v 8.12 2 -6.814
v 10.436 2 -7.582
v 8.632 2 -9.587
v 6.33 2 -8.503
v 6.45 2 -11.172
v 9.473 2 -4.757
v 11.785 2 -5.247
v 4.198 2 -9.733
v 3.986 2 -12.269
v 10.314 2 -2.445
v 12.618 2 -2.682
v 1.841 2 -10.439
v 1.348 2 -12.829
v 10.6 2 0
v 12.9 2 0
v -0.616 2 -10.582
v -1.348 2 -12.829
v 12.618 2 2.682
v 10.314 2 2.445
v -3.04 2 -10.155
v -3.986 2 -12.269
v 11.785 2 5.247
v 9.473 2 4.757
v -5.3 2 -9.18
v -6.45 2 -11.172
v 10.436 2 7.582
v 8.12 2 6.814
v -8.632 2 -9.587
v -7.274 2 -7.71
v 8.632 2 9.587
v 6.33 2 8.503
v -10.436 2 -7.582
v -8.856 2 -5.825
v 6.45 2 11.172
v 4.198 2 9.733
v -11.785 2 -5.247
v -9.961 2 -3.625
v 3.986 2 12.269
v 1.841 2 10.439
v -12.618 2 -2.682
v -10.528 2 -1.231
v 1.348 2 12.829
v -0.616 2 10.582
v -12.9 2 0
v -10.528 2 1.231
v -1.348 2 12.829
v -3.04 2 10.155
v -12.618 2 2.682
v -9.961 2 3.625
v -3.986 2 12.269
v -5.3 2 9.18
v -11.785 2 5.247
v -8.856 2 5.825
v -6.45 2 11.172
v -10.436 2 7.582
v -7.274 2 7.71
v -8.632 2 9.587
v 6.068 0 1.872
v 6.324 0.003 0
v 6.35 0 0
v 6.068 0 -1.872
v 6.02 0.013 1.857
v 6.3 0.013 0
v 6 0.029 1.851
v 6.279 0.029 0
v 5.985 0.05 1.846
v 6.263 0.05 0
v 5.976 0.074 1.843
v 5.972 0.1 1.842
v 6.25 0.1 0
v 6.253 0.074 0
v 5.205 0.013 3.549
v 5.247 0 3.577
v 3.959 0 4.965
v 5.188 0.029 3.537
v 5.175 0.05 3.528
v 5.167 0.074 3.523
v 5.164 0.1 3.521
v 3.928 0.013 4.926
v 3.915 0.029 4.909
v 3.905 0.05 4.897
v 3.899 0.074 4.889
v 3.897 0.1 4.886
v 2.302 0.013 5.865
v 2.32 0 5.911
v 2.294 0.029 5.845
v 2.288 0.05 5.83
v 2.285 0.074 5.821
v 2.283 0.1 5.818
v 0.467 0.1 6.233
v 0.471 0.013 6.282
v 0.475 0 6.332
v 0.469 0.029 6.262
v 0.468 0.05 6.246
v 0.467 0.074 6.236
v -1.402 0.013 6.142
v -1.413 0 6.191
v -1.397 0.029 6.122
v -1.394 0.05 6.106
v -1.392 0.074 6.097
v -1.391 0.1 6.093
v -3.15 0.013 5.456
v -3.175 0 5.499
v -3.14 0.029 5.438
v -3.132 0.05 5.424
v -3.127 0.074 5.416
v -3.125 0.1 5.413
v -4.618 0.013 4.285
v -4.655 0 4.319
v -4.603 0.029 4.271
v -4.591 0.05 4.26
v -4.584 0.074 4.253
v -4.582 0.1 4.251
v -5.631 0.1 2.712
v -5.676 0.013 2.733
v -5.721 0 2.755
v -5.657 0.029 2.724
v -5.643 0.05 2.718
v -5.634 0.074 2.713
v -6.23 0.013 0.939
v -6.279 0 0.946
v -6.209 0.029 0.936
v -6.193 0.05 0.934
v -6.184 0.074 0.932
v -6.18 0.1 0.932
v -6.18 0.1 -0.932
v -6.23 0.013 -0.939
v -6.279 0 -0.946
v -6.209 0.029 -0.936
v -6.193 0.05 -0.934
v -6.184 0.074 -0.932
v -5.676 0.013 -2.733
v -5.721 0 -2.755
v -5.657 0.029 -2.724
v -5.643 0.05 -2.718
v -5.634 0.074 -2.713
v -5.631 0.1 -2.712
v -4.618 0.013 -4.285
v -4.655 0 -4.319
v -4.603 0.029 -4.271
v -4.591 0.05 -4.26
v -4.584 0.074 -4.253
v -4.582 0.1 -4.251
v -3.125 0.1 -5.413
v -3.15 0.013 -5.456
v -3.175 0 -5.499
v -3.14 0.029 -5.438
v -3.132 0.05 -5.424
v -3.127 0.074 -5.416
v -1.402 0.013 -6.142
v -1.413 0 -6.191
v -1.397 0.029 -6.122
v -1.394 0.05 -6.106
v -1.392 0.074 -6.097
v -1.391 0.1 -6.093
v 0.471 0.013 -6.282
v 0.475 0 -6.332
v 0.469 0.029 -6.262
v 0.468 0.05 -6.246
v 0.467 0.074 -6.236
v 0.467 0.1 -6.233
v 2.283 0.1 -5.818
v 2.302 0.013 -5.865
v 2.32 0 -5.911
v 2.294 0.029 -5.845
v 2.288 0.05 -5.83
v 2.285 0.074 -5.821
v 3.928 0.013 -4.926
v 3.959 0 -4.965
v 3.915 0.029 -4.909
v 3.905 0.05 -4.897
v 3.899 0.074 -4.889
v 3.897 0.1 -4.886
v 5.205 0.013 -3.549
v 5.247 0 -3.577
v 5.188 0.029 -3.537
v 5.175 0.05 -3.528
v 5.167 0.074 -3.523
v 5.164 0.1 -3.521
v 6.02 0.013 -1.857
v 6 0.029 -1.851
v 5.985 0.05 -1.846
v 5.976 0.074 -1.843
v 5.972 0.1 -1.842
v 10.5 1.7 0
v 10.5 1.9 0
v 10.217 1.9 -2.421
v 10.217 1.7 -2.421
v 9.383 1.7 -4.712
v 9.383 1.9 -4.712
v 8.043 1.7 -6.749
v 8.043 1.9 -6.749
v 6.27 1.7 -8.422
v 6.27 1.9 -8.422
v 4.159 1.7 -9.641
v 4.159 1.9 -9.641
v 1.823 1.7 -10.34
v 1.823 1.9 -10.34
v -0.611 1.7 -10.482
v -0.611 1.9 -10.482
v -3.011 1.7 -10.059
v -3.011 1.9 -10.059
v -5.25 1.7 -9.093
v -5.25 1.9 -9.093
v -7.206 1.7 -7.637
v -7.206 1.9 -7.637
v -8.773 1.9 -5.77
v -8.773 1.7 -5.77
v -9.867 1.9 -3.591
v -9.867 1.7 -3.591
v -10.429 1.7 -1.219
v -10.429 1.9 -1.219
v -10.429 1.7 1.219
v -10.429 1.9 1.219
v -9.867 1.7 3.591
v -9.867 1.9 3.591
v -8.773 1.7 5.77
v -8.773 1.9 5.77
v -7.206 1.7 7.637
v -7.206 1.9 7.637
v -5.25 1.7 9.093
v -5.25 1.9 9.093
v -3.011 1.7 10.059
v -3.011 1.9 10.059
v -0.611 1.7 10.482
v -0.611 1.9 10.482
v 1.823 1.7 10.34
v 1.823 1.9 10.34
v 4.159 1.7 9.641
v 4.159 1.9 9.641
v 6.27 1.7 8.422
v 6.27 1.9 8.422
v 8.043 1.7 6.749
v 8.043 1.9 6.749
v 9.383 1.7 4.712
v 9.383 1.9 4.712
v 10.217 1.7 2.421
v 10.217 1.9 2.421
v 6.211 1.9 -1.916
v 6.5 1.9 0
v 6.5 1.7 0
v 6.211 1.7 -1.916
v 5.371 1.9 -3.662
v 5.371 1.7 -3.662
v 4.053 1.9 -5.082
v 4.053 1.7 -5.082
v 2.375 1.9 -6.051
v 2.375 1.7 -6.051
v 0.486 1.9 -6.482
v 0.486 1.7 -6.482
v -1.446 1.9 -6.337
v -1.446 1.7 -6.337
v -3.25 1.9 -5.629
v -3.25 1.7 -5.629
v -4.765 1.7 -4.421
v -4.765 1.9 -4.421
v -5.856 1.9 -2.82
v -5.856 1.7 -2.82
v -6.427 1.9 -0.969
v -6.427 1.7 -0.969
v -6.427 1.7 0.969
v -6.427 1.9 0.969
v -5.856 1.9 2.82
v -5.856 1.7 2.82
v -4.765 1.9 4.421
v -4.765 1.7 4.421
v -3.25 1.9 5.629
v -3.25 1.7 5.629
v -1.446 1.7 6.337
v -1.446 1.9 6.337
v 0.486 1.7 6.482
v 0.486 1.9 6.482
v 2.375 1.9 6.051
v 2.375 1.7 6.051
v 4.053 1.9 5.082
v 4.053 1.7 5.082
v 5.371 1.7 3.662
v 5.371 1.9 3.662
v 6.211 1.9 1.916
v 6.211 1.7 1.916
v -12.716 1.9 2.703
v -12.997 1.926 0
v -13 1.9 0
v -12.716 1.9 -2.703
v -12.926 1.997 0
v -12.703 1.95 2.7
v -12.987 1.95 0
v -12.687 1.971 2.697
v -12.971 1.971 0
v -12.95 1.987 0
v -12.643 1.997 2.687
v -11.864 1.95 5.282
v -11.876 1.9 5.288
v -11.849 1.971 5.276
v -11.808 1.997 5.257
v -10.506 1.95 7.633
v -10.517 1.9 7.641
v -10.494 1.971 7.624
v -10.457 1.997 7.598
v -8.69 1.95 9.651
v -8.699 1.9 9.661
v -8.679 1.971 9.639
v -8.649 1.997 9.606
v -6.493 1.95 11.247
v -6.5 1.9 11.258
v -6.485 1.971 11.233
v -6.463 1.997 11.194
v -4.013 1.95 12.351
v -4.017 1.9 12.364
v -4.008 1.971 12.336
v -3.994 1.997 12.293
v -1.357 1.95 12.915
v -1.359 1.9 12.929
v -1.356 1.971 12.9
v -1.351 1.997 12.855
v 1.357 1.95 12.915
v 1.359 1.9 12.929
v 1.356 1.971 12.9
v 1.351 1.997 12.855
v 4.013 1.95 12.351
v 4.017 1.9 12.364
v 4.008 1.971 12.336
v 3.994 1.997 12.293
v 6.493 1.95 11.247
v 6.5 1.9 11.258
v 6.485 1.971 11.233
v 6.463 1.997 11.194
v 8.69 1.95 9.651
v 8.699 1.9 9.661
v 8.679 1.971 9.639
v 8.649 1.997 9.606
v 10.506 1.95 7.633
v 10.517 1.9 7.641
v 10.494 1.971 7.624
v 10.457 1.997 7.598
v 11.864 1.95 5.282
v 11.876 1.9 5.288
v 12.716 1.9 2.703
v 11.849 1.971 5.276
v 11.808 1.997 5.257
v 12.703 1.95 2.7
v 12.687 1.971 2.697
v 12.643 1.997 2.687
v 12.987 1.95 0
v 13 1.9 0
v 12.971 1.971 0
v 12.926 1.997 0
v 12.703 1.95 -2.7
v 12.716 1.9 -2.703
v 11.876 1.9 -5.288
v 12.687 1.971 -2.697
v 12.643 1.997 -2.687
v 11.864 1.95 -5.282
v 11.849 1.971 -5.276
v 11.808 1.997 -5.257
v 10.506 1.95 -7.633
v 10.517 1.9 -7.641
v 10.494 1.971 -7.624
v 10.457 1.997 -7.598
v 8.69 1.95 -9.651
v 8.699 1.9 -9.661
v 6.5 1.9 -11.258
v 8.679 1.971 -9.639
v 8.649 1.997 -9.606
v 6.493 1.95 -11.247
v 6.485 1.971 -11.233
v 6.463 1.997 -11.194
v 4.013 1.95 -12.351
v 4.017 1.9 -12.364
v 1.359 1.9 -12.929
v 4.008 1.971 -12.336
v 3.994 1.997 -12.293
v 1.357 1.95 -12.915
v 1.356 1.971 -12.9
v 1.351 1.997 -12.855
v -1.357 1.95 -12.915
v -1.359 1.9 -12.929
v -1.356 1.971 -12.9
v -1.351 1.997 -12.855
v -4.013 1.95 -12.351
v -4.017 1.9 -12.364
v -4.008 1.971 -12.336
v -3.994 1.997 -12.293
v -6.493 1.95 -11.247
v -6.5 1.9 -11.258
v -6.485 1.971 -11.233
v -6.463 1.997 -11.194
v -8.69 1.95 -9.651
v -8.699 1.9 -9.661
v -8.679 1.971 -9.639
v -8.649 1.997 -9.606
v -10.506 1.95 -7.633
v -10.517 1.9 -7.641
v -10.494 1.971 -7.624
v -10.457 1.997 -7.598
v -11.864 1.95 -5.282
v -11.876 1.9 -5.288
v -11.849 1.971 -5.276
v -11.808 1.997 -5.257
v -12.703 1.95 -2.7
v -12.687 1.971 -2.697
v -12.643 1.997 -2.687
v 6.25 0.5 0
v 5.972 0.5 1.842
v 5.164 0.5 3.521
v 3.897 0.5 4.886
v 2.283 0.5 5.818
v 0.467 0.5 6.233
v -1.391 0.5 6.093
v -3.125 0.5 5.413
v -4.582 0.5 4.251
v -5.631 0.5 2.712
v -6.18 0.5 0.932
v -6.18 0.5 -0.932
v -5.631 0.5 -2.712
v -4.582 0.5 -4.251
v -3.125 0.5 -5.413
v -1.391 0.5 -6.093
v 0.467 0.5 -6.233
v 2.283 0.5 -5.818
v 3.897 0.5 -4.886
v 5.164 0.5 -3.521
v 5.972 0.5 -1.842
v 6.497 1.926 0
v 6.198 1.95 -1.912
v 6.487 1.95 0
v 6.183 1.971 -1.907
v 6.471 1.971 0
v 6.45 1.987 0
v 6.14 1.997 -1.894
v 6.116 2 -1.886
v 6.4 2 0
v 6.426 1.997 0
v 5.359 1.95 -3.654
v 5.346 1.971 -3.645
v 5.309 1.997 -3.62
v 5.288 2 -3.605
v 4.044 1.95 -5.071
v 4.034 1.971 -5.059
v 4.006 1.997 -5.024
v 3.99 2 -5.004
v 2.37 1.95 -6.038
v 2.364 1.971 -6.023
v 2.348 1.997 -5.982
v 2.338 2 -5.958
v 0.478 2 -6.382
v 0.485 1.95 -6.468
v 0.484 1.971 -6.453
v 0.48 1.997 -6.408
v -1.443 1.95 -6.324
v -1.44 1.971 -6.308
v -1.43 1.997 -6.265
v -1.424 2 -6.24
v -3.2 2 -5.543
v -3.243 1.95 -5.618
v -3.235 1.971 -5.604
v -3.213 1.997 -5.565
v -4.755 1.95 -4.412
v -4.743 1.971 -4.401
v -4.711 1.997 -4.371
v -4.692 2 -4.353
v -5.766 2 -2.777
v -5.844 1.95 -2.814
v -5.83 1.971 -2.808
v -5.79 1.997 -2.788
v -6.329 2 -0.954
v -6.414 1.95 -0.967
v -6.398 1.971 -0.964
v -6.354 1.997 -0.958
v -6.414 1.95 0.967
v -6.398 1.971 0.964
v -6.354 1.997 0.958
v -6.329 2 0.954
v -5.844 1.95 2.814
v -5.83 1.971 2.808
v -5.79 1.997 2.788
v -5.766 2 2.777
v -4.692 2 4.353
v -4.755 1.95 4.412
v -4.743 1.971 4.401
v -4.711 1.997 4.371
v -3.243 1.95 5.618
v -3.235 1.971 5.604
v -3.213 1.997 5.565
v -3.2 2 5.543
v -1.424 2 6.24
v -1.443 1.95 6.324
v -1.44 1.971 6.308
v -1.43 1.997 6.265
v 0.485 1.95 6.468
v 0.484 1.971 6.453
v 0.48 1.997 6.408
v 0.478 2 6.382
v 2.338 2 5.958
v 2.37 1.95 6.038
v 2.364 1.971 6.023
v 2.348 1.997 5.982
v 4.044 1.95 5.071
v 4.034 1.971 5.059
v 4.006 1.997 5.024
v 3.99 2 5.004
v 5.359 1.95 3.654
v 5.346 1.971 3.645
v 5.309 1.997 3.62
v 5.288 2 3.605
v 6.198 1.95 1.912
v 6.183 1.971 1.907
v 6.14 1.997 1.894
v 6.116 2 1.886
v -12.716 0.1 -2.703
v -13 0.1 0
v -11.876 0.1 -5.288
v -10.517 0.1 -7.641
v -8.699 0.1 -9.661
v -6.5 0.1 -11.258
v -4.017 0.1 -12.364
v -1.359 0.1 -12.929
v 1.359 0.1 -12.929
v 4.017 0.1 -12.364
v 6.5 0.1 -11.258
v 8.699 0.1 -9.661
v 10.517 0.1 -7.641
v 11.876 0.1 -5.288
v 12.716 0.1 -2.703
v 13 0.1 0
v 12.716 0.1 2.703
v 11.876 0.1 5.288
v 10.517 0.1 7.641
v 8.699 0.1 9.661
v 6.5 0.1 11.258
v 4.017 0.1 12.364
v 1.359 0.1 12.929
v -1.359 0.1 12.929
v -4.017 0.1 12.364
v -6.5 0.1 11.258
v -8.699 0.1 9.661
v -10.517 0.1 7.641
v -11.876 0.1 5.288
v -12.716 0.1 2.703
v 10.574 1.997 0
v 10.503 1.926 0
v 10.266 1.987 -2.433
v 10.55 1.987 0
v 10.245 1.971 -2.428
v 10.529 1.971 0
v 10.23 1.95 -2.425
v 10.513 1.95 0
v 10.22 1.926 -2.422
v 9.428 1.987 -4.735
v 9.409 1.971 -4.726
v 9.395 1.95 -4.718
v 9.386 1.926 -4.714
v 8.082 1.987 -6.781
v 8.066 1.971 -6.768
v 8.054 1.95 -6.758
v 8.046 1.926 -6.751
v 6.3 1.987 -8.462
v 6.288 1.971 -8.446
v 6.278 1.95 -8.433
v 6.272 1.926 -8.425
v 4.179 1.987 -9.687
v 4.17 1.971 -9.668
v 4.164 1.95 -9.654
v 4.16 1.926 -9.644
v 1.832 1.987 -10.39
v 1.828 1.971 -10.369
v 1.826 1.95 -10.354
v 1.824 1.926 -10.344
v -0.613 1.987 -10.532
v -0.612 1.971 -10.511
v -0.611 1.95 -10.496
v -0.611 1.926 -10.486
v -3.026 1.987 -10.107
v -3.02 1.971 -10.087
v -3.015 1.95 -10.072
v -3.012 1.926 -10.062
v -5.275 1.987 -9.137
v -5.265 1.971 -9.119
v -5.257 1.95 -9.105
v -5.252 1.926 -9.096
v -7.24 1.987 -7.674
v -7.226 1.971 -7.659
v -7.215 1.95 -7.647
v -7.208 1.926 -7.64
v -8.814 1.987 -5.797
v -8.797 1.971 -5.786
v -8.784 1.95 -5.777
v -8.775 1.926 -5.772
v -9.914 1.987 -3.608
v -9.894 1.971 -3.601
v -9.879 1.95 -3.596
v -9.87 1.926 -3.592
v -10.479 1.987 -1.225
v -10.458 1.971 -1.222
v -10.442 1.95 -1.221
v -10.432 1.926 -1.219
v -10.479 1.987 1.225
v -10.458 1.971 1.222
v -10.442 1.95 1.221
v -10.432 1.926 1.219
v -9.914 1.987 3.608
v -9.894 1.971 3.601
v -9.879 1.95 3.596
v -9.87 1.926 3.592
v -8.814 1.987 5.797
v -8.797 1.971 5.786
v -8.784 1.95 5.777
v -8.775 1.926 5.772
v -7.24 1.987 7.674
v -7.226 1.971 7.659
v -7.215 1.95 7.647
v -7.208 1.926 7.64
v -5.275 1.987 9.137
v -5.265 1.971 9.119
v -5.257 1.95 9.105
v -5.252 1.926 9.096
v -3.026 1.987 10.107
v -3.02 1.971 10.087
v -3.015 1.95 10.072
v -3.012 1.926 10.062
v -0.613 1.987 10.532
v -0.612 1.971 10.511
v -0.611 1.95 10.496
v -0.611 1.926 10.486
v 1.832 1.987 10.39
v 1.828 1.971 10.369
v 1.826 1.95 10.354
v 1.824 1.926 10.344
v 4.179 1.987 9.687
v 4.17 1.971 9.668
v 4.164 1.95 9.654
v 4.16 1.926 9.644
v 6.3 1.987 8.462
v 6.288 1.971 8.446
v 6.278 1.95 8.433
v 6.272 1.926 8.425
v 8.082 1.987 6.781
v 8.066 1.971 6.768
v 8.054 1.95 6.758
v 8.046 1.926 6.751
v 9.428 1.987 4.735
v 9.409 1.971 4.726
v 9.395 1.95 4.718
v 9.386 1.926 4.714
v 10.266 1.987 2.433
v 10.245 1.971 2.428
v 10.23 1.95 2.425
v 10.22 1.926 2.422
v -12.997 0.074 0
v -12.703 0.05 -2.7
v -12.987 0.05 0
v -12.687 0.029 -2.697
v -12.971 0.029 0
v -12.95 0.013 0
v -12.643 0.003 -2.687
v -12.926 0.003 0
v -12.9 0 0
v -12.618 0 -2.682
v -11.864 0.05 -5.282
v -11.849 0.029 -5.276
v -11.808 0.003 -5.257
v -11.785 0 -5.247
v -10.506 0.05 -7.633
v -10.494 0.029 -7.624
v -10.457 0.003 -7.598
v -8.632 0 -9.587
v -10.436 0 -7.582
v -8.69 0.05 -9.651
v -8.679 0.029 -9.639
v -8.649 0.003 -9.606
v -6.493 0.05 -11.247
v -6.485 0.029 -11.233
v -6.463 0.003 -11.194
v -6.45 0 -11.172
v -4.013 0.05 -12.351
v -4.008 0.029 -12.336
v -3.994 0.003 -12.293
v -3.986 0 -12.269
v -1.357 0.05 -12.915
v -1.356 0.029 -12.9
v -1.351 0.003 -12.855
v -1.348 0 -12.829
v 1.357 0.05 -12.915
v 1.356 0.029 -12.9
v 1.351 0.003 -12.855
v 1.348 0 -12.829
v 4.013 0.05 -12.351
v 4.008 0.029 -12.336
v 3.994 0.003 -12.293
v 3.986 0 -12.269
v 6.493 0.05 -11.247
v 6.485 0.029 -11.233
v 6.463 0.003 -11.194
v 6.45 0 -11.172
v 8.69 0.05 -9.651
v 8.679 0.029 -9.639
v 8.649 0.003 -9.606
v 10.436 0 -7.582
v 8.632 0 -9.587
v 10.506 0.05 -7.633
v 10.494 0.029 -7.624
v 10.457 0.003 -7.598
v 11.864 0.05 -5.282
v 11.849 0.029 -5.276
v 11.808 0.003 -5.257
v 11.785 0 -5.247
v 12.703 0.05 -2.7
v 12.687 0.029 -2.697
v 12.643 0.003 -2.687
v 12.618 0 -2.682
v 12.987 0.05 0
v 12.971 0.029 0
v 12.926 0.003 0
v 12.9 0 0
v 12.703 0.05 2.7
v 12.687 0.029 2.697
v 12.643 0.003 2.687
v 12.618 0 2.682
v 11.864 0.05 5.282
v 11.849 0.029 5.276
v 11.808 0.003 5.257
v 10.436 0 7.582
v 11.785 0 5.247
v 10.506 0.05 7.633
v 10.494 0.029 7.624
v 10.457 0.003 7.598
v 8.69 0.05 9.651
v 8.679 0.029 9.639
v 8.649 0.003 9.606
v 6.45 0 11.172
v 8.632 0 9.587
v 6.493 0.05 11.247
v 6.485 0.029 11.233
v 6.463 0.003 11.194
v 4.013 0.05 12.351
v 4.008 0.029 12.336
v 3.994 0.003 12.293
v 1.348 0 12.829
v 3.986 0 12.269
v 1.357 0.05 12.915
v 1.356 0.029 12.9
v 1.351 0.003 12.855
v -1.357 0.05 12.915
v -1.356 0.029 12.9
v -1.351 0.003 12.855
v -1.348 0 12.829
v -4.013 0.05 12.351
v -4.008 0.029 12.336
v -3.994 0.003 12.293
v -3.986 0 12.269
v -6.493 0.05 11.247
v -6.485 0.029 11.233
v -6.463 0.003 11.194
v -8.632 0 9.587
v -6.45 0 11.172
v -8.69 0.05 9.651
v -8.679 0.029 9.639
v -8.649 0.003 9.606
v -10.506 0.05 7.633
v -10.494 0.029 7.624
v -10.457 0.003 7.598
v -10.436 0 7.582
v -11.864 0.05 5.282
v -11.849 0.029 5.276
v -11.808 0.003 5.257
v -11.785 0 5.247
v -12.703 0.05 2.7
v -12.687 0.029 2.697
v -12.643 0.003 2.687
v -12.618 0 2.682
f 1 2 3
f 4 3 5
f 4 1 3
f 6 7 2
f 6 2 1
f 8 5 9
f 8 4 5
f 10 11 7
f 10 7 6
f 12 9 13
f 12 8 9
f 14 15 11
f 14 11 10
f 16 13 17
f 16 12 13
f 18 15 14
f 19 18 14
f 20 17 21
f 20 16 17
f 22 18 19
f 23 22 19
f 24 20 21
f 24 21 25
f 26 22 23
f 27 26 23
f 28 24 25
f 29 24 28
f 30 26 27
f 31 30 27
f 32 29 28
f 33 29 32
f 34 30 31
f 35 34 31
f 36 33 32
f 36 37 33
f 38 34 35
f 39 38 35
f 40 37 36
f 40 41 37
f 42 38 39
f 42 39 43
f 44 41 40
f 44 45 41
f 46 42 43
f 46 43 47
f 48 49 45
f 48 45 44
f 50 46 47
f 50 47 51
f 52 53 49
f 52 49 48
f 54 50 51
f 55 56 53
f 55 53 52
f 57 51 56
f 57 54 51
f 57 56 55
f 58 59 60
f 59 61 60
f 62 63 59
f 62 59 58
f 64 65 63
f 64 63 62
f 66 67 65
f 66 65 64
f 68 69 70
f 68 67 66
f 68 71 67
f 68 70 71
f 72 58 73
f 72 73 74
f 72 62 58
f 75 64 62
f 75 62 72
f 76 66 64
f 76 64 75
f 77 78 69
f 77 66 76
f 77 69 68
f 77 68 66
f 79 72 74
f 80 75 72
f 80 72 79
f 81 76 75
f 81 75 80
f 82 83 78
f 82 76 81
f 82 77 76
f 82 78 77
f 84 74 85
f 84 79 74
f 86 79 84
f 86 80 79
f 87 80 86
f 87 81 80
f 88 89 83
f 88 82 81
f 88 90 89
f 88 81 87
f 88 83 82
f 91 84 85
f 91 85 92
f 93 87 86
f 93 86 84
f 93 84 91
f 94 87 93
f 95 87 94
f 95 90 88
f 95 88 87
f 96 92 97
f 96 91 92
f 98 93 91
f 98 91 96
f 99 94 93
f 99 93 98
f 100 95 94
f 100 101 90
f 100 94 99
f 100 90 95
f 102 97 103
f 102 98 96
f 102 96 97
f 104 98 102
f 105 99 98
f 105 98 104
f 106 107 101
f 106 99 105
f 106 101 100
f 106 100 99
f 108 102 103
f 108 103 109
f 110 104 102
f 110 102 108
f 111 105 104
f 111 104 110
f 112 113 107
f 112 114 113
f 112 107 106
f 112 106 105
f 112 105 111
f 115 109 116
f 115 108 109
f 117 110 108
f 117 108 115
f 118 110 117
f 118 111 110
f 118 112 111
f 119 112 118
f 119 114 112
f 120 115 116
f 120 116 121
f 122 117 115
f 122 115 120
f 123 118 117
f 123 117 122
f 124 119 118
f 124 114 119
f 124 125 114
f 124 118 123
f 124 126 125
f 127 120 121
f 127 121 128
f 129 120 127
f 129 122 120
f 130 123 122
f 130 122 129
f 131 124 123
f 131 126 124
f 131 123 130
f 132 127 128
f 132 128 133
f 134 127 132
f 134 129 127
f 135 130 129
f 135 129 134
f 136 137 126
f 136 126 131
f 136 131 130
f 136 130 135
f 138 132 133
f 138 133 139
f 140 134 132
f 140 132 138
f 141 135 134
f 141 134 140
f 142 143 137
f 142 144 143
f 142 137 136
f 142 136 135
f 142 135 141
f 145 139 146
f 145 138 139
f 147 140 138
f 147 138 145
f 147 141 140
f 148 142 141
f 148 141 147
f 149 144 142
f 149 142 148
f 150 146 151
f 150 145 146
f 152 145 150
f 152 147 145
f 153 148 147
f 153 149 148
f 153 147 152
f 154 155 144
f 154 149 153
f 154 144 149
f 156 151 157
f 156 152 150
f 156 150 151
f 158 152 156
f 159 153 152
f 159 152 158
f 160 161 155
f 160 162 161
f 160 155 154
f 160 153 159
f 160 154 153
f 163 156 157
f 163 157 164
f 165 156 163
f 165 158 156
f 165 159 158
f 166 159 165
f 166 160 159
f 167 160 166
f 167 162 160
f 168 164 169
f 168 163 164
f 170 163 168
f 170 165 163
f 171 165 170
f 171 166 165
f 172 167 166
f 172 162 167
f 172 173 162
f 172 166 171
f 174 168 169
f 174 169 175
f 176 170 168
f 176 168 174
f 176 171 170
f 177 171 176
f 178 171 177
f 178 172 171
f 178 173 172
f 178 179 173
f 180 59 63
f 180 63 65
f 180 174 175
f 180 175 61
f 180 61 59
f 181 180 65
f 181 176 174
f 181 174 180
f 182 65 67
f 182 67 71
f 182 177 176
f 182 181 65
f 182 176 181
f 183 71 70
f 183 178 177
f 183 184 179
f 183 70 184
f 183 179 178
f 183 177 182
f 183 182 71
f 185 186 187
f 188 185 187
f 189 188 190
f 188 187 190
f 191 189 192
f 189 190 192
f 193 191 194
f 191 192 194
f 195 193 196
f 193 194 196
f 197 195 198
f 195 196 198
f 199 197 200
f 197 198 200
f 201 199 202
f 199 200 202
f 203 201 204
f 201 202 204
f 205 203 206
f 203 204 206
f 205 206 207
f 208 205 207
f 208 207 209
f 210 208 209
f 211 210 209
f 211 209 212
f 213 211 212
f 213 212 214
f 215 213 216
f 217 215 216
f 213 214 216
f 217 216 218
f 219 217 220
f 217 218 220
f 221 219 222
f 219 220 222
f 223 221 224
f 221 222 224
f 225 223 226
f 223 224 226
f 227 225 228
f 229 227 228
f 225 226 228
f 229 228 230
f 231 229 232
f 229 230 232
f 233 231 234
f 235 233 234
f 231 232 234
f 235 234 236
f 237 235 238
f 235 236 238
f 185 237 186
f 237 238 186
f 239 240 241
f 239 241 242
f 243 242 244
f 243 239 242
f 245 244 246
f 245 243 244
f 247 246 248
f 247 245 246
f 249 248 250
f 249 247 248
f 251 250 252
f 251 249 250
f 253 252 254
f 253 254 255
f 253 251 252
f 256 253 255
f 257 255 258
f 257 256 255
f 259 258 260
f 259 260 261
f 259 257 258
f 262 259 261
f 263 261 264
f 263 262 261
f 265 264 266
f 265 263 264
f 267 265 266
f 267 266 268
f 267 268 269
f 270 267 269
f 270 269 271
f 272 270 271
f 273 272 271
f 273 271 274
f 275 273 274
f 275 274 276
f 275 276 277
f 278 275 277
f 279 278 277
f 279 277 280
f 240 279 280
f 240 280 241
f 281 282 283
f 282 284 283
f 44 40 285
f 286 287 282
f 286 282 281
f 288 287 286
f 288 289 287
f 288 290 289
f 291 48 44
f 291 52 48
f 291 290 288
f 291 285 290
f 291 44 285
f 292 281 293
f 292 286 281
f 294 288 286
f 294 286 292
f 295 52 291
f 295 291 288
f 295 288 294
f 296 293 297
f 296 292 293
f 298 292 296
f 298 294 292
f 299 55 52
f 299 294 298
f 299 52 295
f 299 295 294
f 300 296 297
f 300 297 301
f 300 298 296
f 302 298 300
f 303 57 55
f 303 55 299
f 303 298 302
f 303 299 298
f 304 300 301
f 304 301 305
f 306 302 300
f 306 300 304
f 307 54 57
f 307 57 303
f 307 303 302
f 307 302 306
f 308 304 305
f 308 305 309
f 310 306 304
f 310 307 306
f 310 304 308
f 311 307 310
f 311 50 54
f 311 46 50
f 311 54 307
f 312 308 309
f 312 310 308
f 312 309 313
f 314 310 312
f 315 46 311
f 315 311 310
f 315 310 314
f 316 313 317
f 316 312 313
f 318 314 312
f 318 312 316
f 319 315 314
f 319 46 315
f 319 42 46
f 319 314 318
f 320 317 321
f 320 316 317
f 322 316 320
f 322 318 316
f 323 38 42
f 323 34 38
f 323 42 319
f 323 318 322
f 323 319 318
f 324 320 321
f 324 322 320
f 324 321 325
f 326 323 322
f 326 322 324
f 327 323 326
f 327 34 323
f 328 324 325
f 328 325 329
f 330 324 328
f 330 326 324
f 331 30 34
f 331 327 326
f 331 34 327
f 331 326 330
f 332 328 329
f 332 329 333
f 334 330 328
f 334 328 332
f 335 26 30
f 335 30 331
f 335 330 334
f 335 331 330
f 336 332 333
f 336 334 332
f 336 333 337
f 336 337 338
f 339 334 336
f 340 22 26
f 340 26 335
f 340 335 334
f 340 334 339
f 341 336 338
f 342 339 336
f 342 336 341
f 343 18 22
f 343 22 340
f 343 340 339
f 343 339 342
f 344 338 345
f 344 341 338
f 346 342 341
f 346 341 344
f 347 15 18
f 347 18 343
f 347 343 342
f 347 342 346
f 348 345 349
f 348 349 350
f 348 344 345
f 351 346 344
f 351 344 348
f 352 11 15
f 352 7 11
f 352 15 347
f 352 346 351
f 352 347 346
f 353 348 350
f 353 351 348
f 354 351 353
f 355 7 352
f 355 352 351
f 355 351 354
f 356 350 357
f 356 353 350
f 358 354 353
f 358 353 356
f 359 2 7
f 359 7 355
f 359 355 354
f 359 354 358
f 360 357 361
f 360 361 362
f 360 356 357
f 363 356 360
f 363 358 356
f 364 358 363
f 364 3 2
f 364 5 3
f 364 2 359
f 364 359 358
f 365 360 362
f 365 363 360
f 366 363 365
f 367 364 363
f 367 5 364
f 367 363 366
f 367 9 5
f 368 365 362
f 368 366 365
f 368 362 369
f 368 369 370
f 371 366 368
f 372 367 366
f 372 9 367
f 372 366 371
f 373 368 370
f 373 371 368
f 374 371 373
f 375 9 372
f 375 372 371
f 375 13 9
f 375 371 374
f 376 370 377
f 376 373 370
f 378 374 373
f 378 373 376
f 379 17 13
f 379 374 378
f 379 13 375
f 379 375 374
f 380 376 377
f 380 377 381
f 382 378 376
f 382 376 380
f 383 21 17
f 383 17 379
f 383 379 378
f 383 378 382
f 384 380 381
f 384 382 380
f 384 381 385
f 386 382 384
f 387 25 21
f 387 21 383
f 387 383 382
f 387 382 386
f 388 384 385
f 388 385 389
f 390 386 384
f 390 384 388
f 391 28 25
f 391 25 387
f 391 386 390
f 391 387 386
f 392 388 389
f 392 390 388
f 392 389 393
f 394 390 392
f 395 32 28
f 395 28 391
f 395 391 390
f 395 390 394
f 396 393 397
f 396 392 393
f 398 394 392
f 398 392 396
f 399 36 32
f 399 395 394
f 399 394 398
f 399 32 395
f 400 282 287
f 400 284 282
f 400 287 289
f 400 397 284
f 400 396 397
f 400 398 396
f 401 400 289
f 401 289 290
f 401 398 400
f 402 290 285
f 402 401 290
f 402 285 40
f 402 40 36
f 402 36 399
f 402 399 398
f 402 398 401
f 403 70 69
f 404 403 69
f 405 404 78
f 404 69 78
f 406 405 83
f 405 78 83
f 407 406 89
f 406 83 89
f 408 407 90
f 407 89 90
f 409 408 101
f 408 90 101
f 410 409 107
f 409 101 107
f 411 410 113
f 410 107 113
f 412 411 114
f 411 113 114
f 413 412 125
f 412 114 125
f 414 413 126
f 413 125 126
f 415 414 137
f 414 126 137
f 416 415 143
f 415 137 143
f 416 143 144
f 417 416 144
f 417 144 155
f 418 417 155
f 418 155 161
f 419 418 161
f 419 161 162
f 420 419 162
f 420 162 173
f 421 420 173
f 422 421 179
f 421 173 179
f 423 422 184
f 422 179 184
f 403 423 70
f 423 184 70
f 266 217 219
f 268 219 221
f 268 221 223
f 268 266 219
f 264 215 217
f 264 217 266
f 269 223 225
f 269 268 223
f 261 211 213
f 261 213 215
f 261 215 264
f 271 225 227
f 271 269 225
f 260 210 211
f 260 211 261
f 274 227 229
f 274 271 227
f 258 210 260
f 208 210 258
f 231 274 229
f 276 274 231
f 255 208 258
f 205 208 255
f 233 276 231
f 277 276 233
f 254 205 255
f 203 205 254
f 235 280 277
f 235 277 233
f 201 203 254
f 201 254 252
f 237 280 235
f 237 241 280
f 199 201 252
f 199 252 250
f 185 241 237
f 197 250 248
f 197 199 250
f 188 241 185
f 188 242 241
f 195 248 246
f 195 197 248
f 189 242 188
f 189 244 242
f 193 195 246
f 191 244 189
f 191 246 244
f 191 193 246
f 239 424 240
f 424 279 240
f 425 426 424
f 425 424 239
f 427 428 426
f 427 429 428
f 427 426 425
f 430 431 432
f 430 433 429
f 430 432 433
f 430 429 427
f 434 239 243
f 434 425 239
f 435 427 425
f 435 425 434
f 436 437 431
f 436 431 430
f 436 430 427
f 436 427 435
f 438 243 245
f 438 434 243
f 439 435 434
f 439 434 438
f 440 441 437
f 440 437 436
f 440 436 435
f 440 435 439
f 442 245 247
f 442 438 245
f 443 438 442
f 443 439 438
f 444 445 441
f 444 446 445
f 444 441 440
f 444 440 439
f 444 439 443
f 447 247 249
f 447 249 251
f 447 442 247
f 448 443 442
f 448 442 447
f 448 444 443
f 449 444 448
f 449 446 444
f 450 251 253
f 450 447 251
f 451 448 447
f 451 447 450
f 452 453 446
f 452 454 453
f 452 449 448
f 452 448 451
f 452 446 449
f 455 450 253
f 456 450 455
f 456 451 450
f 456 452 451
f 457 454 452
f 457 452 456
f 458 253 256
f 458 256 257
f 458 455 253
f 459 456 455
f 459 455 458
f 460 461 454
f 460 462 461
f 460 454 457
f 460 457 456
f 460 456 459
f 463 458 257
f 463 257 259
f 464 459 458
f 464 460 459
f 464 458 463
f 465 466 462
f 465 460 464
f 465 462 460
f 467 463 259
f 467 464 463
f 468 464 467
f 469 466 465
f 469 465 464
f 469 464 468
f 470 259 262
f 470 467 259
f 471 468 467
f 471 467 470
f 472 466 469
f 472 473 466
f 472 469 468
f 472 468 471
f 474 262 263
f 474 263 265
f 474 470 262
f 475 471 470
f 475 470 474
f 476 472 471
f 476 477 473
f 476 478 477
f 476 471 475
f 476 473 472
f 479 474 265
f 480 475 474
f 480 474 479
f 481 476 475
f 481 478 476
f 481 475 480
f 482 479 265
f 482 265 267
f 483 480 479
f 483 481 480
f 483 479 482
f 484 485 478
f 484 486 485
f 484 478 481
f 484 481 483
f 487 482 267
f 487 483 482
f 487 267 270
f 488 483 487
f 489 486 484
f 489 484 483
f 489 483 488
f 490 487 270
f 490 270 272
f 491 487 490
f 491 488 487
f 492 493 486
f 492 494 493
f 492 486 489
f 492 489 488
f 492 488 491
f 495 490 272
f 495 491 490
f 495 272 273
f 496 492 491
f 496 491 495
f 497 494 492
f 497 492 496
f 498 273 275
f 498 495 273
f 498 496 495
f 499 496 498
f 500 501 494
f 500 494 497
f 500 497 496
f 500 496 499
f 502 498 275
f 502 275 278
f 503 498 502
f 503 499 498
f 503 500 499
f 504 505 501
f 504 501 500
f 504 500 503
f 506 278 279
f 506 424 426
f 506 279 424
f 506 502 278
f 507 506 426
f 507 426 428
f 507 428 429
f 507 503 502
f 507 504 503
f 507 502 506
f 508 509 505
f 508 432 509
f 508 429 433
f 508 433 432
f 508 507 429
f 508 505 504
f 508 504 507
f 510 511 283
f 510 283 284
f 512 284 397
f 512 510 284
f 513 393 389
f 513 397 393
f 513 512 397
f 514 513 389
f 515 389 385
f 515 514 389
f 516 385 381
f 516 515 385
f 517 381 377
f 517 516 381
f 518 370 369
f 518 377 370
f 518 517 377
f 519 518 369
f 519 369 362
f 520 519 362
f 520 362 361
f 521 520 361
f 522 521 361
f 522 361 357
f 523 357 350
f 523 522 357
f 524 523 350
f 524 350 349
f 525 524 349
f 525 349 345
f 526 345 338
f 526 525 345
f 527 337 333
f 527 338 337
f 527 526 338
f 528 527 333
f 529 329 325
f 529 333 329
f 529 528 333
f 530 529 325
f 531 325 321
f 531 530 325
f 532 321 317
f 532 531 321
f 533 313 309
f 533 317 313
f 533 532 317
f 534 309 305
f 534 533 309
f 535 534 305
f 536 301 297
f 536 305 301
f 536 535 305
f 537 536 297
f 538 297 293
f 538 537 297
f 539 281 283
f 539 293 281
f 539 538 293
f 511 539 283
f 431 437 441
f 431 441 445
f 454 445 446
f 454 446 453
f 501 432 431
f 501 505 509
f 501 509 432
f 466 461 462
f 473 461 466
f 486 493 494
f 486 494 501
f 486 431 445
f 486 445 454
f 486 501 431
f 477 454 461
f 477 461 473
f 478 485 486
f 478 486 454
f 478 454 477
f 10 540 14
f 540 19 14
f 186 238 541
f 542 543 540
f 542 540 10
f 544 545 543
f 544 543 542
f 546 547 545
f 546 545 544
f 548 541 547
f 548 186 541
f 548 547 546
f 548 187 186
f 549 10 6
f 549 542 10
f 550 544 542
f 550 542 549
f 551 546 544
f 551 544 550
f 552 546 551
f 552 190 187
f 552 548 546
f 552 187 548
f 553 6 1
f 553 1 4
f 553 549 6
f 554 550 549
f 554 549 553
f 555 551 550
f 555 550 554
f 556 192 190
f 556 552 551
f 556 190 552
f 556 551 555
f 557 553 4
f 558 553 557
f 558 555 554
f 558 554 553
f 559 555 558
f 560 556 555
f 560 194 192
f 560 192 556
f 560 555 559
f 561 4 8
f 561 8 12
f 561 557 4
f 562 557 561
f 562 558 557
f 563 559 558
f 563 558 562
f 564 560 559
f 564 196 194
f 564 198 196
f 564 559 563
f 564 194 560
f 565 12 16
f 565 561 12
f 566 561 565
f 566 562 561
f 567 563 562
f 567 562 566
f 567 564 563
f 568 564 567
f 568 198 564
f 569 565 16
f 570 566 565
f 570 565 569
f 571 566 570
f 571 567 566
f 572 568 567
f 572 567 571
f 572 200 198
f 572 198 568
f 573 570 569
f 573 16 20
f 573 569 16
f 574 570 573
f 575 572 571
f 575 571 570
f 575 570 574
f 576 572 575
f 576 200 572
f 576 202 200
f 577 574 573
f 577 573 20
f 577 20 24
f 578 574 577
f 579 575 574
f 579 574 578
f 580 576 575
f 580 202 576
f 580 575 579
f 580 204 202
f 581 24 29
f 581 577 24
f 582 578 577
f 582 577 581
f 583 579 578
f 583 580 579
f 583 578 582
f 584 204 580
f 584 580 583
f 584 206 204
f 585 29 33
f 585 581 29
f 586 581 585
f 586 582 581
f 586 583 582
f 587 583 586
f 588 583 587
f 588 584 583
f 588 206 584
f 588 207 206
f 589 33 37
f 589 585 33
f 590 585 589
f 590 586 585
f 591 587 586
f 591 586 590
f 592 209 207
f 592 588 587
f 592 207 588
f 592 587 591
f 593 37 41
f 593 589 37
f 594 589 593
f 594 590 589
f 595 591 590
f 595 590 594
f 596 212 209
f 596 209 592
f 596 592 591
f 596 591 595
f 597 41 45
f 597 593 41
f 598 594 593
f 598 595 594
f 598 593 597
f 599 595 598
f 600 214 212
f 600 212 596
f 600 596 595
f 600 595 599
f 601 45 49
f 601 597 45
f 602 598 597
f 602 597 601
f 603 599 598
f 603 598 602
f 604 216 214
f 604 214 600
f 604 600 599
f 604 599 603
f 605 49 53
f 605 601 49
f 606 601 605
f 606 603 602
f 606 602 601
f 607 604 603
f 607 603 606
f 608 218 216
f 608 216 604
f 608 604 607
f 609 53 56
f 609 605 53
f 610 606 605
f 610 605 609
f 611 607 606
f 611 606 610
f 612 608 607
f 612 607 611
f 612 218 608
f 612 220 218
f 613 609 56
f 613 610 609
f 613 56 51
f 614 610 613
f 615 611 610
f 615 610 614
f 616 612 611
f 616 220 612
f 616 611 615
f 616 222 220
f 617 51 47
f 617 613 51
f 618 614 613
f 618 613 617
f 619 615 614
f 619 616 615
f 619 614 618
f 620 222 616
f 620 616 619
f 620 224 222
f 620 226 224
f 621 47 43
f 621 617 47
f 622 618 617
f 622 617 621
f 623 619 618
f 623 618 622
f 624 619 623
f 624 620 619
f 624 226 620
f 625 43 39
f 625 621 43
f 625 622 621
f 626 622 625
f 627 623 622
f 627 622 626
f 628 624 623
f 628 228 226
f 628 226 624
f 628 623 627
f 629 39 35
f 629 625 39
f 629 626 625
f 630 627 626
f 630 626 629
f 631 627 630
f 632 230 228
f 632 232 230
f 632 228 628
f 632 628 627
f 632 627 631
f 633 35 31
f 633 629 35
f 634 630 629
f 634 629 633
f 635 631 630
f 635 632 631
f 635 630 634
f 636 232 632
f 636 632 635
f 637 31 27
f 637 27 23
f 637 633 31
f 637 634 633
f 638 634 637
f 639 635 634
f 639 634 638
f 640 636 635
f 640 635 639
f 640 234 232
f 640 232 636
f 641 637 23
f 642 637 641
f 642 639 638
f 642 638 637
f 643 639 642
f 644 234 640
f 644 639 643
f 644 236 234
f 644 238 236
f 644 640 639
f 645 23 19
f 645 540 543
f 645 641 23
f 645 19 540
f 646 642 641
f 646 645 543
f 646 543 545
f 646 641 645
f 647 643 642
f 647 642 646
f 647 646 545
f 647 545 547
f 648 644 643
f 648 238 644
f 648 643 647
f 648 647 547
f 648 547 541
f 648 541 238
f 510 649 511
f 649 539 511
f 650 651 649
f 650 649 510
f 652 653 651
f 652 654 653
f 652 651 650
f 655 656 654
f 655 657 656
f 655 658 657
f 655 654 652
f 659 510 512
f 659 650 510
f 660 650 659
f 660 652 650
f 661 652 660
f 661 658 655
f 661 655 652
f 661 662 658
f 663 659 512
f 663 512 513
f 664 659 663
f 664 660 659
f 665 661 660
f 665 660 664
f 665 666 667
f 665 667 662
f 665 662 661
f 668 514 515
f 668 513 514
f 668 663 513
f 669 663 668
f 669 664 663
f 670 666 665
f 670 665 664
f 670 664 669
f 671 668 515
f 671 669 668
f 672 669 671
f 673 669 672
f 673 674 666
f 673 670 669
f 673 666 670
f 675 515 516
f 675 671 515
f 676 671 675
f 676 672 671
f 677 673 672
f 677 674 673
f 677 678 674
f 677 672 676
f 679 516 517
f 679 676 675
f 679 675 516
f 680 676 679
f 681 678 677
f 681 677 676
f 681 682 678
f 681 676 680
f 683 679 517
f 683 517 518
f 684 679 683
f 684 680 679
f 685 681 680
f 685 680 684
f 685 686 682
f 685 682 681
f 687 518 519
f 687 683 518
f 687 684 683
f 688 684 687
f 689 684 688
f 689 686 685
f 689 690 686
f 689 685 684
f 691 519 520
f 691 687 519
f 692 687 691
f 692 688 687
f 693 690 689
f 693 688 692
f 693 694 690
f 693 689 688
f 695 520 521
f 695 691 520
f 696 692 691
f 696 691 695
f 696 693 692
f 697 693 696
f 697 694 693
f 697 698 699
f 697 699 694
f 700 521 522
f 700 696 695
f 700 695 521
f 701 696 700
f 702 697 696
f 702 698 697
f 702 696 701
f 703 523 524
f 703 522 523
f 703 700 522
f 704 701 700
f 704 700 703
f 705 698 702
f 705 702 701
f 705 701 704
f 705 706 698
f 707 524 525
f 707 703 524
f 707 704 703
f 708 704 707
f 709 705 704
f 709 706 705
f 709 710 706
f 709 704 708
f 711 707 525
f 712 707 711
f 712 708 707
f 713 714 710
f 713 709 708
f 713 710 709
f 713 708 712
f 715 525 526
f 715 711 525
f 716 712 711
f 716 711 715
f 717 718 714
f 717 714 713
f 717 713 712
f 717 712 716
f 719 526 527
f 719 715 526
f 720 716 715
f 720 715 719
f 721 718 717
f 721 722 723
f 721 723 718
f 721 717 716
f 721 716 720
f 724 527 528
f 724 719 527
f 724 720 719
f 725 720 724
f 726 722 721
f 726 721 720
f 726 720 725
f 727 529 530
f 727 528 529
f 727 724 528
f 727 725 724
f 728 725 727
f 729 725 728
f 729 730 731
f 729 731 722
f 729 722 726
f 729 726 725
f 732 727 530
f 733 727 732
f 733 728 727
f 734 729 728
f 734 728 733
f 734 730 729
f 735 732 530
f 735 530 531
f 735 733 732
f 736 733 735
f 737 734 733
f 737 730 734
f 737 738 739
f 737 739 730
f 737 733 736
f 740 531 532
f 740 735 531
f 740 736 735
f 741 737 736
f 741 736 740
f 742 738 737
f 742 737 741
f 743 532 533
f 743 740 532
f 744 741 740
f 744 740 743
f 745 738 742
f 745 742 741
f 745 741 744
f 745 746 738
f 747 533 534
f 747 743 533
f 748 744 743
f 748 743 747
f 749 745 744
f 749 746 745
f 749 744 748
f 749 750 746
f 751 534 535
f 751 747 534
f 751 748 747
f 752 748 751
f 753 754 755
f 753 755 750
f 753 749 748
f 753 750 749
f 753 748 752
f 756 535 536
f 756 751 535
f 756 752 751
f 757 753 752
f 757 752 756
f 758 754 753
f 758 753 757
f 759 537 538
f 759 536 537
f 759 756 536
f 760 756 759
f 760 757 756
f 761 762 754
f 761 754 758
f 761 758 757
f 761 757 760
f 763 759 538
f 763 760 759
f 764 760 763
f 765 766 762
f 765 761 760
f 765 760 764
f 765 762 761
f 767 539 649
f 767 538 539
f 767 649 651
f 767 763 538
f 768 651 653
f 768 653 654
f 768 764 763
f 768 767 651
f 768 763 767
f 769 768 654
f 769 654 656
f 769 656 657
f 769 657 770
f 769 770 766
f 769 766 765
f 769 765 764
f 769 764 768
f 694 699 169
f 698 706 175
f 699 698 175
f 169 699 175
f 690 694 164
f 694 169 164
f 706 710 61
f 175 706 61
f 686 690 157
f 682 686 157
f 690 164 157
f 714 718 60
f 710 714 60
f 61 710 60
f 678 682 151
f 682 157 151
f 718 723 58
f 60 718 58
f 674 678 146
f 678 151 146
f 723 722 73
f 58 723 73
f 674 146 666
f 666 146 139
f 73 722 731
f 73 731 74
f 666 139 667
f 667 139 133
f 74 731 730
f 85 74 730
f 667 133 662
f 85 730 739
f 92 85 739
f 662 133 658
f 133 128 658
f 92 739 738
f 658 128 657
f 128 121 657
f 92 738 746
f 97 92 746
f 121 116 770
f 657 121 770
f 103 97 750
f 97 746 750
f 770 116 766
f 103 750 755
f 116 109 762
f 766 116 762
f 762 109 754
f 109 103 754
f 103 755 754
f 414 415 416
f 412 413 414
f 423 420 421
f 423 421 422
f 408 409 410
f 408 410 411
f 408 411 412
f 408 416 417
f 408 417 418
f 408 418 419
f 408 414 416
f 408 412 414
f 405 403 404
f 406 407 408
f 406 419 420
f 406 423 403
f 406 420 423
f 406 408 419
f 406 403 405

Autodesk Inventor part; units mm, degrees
ref_plane "YZ Plane" through (0, 0, 0) normal (1, 0, 0) x (0, 1, 0)
ref_plane "XZ Plane" through (0, 0, 0) normal (0, 1, 0) x (-1, 0, 0)
ref_plane "XY Plane" through (0, 0, 0) normal (0, 0, 1) x (1, 0, 0)
sketch "Sketch1" plane through (0, 0, 0) normal (0, 1, 0) x (-1, 0, 0)
  circle A0 centre (0, 0) radius 13
  dimension "d0" = 26
extrude "Extrusion1" add sketch "Sketch1" along normal blind 2
sketch "Sketch2" plane through (0, 2, 0) normal (0, 1, 0) x (1, 0, 0)
  circle A0 centre (0, 0) radius 13 construction
  circle A1 centre (0, 0) radius 10.5
  circle A2 centre (0, 0) radius 6.5
  dimension "d3" = 2.5
  dimension "d4" = 4
extrude "Extrusion2" cut sketch "Sketch2" against normal blind 0.3
sketch "Sketch3" plane through (0, 0, 0) normal (0, -1, 0) x (1, 0, 0)
  circle A0 centre (0, 0) radius 6.25
  dimension "d7" = 12.5
extrude "Extrusion3" cut sketch "Sketch3" against normal blind 0.5
fillet "Fillet1" radius 0.1 5 edges at (13, 2, 0) (-10.5, 2, 0) (-6.5, 2, 0) (13, 0, 0) (-6.25, 0, 0)
properties part number "ThrustWasher" material "Steel, Alloy"
